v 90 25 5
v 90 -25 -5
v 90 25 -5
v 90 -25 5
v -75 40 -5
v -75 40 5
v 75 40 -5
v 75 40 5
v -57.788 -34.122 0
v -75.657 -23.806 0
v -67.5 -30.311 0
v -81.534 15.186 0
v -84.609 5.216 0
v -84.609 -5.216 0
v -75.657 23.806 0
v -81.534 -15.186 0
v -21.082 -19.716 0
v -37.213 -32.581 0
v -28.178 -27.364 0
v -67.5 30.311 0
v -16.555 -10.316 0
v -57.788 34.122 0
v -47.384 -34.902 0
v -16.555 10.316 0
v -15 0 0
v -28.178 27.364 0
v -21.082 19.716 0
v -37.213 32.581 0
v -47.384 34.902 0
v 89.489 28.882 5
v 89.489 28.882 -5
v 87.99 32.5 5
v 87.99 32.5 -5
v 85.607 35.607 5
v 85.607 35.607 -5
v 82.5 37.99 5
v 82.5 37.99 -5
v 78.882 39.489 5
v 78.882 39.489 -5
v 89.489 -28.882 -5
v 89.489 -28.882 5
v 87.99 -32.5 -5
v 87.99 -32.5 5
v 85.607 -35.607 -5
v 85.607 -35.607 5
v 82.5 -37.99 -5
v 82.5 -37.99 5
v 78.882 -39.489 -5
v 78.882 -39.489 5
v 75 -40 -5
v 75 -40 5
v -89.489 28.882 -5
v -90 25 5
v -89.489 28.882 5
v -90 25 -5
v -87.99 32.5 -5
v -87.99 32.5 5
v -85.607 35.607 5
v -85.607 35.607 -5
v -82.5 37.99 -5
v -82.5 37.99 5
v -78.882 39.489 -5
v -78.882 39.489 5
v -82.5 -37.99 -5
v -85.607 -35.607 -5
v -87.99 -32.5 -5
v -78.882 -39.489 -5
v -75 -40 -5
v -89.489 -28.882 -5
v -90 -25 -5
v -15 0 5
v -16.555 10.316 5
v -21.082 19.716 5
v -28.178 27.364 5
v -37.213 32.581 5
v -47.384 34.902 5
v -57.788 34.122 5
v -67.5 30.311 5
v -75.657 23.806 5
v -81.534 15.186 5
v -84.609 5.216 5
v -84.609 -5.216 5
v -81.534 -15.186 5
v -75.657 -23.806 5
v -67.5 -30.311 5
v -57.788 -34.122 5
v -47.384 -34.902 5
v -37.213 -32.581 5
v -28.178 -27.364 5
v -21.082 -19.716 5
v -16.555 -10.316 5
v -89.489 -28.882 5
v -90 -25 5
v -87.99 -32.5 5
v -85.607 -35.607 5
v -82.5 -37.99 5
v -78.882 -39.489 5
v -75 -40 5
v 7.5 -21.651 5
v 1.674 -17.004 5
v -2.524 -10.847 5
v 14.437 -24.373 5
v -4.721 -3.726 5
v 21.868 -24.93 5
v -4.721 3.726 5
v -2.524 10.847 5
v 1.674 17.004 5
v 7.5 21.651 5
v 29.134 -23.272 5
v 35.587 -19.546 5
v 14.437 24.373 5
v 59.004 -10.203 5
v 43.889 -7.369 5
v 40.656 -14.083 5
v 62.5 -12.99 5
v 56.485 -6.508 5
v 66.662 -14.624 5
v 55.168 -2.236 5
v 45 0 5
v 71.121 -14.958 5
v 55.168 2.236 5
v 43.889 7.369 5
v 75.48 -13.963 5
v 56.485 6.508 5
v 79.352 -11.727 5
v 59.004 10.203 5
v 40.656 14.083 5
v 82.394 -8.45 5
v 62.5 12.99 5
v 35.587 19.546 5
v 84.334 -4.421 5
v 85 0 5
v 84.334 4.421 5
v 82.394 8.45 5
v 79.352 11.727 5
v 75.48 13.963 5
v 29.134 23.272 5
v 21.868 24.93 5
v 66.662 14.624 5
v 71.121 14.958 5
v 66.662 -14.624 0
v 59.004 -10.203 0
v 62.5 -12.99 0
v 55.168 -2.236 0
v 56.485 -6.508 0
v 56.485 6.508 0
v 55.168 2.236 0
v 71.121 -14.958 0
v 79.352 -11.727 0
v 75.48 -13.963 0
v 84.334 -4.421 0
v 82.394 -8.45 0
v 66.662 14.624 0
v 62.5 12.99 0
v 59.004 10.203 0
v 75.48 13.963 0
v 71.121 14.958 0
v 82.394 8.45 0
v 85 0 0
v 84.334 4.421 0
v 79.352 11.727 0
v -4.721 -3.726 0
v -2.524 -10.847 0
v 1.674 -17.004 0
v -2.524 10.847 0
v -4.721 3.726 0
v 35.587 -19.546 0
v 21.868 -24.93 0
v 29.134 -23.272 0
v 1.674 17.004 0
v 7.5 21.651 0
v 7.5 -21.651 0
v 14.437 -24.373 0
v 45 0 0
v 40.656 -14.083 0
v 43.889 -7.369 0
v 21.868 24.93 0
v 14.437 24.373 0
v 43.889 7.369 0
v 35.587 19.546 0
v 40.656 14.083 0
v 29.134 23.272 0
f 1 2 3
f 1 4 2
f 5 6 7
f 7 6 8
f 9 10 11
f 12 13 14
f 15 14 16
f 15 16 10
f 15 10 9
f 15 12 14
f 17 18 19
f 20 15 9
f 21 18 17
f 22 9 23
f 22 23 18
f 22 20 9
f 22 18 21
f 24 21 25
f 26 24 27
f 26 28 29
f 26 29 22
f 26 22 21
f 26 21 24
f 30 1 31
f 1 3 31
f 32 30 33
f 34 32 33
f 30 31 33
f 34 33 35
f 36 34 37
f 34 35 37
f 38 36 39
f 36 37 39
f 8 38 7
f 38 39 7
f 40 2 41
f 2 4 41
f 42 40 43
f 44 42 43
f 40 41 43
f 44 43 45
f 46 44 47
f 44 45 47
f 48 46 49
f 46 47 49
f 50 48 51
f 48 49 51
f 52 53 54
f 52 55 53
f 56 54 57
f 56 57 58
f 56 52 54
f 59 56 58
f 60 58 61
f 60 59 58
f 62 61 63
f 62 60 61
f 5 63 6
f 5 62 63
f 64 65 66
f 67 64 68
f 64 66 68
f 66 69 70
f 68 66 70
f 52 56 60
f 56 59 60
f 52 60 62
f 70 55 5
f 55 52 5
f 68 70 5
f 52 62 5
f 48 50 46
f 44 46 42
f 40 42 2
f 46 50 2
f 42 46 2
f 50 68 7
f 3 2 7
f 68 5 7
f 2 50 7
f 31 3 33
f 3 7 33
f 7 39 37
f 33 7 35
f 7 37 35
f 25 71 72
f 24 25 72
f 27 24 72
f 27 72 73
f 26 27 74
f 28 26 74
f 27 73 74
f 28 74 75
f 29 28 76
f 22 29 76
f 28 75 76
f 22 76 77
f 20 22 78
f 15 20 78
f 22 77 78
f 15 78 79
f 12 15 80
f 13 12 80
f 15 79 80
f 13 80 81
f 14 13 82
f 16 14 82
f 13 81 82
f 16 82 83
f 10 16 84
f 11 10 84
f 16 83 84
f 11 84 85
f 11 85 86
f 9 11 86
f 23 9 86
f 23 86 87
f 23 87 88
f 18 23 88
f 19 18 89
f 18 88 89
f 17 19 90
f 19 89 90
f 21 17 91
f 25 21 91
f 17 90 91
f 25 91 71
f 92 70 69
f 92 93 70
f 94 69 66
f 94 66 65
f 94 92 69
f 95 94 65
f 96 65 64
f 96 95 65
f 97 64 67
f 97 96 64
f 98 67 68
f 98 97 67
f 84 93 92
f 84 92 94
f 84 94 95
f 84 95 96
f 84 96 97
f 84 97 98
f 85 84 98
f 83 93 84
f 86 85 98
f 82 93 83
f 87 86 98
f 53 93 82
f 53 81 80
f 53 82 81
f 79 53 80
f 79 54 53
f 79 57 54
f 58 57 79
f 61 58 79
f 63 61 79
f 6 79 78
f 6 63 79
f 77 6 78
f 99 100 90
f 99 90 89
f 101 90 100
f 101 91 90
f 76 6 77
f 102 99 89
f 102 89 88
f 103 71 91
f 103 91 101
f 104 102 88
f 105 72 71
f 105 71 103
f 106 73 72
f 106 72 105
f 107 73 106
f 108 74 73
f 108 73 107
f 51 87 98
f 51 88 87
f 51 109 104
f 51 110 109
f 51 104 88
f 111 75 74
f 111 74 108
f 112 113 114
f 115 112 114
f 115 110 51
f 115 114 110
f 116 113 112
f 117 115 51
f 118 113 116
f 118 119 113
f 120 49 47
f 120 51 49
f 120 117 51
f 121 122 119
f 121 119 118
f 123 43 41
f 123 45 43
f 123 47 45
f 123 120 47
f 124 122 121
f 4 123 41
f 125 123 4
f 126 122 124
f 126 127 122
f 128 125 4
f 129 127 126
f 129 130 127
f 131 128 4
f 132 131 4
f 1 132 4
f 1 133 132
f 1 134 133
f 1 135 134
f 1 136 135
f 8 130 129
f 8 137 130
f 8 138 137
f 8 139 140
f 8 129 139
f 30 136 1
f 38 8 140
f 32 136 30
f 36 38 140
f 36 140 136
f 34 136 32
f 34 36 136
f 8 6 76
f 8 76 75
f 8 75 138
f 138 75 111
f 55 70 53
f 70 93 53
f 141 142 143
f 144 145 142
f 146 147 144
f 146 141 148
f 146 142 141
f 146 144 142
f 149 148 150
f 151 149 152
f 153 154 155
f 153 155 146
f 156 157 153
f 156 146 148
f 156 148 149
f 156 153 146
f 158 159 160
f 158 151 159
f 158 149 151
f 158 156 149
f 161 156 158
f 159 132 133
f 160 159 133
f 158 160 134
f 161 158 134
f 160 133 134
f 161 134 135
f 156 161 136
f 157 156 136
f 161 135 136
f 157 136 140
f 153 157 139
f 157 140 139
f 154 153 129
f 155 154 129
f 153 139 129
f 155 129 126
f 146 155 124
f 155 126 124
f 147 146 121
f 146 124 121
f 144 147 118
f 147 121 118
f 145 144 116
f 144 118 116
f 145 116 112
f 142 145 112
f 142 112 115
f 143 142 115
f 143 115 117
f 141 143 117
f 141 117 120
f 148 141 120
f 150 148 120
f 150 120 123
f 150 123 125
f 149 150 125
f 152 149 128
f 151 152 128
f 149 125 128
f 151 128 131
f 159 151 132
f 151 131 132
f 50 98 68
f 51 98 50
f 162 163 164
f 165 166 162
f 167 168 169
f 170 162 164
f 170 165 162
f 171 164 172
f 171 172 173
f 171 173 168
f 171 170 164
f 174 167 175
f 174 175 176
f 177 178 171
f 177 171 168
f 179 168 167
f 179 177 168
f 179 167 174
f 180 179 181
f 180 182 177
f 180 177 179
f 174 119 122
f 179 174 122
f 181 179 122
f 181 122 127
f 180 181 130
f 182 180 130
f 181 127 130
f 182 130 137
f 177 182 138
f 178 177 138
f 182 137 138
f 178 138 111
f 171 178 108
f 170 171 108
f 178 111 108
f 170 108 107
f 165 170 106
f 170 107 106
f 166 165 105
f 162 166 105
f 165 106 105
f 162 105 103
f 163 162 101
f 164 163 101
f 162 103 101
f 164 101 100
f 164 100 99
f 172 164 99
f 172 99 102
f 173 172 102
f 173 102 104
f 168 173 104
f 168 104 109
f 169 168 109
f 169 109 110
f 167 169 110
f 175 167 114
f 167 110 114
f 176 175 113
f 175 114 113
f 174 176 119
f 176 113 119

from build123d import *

# Parameters (mm, degrees)
F0_W     = 180
F0_H     = 80
F1_DEPTH = 5
F2_R     = 15
F3_R     = 35
F3_R_2   = 25
F3_R_3   = 15
F4_DEPTH = 5


with BuildPart() as f1:
    # F0 (on Top) → F1 (new body, symmetric)
    with BuildSketch(Plane.XY):
        Rectangle(F0_W, F0_H)
    extrude(amount=F1_DEPTH, both=True)

    # F2
    f2_edges = [f1.edges().sort_by_distance(p)[0] for p in [
        (90, 40, 0),
        (-90, 40, 0),
        (90, -40, 0),
        (-90, -40, 0),
    ]]
    fillet(f2_edges, radius=F2_R)

    # F3 (on face) → F4 (cut)
    with BuildSketch(Plane.XY.offset(5)):
        with Locations((-50, 0)):
            Circle(F3_R)
        with Locations((20, 0)):
            Circle(F3_R_2)
        with Locations((70, 0)):
            Circle(F3_R_3)
    extrude(amount=-F4_DEPTH, mode=Mode.SUBTRACT)


solid = f1.part
